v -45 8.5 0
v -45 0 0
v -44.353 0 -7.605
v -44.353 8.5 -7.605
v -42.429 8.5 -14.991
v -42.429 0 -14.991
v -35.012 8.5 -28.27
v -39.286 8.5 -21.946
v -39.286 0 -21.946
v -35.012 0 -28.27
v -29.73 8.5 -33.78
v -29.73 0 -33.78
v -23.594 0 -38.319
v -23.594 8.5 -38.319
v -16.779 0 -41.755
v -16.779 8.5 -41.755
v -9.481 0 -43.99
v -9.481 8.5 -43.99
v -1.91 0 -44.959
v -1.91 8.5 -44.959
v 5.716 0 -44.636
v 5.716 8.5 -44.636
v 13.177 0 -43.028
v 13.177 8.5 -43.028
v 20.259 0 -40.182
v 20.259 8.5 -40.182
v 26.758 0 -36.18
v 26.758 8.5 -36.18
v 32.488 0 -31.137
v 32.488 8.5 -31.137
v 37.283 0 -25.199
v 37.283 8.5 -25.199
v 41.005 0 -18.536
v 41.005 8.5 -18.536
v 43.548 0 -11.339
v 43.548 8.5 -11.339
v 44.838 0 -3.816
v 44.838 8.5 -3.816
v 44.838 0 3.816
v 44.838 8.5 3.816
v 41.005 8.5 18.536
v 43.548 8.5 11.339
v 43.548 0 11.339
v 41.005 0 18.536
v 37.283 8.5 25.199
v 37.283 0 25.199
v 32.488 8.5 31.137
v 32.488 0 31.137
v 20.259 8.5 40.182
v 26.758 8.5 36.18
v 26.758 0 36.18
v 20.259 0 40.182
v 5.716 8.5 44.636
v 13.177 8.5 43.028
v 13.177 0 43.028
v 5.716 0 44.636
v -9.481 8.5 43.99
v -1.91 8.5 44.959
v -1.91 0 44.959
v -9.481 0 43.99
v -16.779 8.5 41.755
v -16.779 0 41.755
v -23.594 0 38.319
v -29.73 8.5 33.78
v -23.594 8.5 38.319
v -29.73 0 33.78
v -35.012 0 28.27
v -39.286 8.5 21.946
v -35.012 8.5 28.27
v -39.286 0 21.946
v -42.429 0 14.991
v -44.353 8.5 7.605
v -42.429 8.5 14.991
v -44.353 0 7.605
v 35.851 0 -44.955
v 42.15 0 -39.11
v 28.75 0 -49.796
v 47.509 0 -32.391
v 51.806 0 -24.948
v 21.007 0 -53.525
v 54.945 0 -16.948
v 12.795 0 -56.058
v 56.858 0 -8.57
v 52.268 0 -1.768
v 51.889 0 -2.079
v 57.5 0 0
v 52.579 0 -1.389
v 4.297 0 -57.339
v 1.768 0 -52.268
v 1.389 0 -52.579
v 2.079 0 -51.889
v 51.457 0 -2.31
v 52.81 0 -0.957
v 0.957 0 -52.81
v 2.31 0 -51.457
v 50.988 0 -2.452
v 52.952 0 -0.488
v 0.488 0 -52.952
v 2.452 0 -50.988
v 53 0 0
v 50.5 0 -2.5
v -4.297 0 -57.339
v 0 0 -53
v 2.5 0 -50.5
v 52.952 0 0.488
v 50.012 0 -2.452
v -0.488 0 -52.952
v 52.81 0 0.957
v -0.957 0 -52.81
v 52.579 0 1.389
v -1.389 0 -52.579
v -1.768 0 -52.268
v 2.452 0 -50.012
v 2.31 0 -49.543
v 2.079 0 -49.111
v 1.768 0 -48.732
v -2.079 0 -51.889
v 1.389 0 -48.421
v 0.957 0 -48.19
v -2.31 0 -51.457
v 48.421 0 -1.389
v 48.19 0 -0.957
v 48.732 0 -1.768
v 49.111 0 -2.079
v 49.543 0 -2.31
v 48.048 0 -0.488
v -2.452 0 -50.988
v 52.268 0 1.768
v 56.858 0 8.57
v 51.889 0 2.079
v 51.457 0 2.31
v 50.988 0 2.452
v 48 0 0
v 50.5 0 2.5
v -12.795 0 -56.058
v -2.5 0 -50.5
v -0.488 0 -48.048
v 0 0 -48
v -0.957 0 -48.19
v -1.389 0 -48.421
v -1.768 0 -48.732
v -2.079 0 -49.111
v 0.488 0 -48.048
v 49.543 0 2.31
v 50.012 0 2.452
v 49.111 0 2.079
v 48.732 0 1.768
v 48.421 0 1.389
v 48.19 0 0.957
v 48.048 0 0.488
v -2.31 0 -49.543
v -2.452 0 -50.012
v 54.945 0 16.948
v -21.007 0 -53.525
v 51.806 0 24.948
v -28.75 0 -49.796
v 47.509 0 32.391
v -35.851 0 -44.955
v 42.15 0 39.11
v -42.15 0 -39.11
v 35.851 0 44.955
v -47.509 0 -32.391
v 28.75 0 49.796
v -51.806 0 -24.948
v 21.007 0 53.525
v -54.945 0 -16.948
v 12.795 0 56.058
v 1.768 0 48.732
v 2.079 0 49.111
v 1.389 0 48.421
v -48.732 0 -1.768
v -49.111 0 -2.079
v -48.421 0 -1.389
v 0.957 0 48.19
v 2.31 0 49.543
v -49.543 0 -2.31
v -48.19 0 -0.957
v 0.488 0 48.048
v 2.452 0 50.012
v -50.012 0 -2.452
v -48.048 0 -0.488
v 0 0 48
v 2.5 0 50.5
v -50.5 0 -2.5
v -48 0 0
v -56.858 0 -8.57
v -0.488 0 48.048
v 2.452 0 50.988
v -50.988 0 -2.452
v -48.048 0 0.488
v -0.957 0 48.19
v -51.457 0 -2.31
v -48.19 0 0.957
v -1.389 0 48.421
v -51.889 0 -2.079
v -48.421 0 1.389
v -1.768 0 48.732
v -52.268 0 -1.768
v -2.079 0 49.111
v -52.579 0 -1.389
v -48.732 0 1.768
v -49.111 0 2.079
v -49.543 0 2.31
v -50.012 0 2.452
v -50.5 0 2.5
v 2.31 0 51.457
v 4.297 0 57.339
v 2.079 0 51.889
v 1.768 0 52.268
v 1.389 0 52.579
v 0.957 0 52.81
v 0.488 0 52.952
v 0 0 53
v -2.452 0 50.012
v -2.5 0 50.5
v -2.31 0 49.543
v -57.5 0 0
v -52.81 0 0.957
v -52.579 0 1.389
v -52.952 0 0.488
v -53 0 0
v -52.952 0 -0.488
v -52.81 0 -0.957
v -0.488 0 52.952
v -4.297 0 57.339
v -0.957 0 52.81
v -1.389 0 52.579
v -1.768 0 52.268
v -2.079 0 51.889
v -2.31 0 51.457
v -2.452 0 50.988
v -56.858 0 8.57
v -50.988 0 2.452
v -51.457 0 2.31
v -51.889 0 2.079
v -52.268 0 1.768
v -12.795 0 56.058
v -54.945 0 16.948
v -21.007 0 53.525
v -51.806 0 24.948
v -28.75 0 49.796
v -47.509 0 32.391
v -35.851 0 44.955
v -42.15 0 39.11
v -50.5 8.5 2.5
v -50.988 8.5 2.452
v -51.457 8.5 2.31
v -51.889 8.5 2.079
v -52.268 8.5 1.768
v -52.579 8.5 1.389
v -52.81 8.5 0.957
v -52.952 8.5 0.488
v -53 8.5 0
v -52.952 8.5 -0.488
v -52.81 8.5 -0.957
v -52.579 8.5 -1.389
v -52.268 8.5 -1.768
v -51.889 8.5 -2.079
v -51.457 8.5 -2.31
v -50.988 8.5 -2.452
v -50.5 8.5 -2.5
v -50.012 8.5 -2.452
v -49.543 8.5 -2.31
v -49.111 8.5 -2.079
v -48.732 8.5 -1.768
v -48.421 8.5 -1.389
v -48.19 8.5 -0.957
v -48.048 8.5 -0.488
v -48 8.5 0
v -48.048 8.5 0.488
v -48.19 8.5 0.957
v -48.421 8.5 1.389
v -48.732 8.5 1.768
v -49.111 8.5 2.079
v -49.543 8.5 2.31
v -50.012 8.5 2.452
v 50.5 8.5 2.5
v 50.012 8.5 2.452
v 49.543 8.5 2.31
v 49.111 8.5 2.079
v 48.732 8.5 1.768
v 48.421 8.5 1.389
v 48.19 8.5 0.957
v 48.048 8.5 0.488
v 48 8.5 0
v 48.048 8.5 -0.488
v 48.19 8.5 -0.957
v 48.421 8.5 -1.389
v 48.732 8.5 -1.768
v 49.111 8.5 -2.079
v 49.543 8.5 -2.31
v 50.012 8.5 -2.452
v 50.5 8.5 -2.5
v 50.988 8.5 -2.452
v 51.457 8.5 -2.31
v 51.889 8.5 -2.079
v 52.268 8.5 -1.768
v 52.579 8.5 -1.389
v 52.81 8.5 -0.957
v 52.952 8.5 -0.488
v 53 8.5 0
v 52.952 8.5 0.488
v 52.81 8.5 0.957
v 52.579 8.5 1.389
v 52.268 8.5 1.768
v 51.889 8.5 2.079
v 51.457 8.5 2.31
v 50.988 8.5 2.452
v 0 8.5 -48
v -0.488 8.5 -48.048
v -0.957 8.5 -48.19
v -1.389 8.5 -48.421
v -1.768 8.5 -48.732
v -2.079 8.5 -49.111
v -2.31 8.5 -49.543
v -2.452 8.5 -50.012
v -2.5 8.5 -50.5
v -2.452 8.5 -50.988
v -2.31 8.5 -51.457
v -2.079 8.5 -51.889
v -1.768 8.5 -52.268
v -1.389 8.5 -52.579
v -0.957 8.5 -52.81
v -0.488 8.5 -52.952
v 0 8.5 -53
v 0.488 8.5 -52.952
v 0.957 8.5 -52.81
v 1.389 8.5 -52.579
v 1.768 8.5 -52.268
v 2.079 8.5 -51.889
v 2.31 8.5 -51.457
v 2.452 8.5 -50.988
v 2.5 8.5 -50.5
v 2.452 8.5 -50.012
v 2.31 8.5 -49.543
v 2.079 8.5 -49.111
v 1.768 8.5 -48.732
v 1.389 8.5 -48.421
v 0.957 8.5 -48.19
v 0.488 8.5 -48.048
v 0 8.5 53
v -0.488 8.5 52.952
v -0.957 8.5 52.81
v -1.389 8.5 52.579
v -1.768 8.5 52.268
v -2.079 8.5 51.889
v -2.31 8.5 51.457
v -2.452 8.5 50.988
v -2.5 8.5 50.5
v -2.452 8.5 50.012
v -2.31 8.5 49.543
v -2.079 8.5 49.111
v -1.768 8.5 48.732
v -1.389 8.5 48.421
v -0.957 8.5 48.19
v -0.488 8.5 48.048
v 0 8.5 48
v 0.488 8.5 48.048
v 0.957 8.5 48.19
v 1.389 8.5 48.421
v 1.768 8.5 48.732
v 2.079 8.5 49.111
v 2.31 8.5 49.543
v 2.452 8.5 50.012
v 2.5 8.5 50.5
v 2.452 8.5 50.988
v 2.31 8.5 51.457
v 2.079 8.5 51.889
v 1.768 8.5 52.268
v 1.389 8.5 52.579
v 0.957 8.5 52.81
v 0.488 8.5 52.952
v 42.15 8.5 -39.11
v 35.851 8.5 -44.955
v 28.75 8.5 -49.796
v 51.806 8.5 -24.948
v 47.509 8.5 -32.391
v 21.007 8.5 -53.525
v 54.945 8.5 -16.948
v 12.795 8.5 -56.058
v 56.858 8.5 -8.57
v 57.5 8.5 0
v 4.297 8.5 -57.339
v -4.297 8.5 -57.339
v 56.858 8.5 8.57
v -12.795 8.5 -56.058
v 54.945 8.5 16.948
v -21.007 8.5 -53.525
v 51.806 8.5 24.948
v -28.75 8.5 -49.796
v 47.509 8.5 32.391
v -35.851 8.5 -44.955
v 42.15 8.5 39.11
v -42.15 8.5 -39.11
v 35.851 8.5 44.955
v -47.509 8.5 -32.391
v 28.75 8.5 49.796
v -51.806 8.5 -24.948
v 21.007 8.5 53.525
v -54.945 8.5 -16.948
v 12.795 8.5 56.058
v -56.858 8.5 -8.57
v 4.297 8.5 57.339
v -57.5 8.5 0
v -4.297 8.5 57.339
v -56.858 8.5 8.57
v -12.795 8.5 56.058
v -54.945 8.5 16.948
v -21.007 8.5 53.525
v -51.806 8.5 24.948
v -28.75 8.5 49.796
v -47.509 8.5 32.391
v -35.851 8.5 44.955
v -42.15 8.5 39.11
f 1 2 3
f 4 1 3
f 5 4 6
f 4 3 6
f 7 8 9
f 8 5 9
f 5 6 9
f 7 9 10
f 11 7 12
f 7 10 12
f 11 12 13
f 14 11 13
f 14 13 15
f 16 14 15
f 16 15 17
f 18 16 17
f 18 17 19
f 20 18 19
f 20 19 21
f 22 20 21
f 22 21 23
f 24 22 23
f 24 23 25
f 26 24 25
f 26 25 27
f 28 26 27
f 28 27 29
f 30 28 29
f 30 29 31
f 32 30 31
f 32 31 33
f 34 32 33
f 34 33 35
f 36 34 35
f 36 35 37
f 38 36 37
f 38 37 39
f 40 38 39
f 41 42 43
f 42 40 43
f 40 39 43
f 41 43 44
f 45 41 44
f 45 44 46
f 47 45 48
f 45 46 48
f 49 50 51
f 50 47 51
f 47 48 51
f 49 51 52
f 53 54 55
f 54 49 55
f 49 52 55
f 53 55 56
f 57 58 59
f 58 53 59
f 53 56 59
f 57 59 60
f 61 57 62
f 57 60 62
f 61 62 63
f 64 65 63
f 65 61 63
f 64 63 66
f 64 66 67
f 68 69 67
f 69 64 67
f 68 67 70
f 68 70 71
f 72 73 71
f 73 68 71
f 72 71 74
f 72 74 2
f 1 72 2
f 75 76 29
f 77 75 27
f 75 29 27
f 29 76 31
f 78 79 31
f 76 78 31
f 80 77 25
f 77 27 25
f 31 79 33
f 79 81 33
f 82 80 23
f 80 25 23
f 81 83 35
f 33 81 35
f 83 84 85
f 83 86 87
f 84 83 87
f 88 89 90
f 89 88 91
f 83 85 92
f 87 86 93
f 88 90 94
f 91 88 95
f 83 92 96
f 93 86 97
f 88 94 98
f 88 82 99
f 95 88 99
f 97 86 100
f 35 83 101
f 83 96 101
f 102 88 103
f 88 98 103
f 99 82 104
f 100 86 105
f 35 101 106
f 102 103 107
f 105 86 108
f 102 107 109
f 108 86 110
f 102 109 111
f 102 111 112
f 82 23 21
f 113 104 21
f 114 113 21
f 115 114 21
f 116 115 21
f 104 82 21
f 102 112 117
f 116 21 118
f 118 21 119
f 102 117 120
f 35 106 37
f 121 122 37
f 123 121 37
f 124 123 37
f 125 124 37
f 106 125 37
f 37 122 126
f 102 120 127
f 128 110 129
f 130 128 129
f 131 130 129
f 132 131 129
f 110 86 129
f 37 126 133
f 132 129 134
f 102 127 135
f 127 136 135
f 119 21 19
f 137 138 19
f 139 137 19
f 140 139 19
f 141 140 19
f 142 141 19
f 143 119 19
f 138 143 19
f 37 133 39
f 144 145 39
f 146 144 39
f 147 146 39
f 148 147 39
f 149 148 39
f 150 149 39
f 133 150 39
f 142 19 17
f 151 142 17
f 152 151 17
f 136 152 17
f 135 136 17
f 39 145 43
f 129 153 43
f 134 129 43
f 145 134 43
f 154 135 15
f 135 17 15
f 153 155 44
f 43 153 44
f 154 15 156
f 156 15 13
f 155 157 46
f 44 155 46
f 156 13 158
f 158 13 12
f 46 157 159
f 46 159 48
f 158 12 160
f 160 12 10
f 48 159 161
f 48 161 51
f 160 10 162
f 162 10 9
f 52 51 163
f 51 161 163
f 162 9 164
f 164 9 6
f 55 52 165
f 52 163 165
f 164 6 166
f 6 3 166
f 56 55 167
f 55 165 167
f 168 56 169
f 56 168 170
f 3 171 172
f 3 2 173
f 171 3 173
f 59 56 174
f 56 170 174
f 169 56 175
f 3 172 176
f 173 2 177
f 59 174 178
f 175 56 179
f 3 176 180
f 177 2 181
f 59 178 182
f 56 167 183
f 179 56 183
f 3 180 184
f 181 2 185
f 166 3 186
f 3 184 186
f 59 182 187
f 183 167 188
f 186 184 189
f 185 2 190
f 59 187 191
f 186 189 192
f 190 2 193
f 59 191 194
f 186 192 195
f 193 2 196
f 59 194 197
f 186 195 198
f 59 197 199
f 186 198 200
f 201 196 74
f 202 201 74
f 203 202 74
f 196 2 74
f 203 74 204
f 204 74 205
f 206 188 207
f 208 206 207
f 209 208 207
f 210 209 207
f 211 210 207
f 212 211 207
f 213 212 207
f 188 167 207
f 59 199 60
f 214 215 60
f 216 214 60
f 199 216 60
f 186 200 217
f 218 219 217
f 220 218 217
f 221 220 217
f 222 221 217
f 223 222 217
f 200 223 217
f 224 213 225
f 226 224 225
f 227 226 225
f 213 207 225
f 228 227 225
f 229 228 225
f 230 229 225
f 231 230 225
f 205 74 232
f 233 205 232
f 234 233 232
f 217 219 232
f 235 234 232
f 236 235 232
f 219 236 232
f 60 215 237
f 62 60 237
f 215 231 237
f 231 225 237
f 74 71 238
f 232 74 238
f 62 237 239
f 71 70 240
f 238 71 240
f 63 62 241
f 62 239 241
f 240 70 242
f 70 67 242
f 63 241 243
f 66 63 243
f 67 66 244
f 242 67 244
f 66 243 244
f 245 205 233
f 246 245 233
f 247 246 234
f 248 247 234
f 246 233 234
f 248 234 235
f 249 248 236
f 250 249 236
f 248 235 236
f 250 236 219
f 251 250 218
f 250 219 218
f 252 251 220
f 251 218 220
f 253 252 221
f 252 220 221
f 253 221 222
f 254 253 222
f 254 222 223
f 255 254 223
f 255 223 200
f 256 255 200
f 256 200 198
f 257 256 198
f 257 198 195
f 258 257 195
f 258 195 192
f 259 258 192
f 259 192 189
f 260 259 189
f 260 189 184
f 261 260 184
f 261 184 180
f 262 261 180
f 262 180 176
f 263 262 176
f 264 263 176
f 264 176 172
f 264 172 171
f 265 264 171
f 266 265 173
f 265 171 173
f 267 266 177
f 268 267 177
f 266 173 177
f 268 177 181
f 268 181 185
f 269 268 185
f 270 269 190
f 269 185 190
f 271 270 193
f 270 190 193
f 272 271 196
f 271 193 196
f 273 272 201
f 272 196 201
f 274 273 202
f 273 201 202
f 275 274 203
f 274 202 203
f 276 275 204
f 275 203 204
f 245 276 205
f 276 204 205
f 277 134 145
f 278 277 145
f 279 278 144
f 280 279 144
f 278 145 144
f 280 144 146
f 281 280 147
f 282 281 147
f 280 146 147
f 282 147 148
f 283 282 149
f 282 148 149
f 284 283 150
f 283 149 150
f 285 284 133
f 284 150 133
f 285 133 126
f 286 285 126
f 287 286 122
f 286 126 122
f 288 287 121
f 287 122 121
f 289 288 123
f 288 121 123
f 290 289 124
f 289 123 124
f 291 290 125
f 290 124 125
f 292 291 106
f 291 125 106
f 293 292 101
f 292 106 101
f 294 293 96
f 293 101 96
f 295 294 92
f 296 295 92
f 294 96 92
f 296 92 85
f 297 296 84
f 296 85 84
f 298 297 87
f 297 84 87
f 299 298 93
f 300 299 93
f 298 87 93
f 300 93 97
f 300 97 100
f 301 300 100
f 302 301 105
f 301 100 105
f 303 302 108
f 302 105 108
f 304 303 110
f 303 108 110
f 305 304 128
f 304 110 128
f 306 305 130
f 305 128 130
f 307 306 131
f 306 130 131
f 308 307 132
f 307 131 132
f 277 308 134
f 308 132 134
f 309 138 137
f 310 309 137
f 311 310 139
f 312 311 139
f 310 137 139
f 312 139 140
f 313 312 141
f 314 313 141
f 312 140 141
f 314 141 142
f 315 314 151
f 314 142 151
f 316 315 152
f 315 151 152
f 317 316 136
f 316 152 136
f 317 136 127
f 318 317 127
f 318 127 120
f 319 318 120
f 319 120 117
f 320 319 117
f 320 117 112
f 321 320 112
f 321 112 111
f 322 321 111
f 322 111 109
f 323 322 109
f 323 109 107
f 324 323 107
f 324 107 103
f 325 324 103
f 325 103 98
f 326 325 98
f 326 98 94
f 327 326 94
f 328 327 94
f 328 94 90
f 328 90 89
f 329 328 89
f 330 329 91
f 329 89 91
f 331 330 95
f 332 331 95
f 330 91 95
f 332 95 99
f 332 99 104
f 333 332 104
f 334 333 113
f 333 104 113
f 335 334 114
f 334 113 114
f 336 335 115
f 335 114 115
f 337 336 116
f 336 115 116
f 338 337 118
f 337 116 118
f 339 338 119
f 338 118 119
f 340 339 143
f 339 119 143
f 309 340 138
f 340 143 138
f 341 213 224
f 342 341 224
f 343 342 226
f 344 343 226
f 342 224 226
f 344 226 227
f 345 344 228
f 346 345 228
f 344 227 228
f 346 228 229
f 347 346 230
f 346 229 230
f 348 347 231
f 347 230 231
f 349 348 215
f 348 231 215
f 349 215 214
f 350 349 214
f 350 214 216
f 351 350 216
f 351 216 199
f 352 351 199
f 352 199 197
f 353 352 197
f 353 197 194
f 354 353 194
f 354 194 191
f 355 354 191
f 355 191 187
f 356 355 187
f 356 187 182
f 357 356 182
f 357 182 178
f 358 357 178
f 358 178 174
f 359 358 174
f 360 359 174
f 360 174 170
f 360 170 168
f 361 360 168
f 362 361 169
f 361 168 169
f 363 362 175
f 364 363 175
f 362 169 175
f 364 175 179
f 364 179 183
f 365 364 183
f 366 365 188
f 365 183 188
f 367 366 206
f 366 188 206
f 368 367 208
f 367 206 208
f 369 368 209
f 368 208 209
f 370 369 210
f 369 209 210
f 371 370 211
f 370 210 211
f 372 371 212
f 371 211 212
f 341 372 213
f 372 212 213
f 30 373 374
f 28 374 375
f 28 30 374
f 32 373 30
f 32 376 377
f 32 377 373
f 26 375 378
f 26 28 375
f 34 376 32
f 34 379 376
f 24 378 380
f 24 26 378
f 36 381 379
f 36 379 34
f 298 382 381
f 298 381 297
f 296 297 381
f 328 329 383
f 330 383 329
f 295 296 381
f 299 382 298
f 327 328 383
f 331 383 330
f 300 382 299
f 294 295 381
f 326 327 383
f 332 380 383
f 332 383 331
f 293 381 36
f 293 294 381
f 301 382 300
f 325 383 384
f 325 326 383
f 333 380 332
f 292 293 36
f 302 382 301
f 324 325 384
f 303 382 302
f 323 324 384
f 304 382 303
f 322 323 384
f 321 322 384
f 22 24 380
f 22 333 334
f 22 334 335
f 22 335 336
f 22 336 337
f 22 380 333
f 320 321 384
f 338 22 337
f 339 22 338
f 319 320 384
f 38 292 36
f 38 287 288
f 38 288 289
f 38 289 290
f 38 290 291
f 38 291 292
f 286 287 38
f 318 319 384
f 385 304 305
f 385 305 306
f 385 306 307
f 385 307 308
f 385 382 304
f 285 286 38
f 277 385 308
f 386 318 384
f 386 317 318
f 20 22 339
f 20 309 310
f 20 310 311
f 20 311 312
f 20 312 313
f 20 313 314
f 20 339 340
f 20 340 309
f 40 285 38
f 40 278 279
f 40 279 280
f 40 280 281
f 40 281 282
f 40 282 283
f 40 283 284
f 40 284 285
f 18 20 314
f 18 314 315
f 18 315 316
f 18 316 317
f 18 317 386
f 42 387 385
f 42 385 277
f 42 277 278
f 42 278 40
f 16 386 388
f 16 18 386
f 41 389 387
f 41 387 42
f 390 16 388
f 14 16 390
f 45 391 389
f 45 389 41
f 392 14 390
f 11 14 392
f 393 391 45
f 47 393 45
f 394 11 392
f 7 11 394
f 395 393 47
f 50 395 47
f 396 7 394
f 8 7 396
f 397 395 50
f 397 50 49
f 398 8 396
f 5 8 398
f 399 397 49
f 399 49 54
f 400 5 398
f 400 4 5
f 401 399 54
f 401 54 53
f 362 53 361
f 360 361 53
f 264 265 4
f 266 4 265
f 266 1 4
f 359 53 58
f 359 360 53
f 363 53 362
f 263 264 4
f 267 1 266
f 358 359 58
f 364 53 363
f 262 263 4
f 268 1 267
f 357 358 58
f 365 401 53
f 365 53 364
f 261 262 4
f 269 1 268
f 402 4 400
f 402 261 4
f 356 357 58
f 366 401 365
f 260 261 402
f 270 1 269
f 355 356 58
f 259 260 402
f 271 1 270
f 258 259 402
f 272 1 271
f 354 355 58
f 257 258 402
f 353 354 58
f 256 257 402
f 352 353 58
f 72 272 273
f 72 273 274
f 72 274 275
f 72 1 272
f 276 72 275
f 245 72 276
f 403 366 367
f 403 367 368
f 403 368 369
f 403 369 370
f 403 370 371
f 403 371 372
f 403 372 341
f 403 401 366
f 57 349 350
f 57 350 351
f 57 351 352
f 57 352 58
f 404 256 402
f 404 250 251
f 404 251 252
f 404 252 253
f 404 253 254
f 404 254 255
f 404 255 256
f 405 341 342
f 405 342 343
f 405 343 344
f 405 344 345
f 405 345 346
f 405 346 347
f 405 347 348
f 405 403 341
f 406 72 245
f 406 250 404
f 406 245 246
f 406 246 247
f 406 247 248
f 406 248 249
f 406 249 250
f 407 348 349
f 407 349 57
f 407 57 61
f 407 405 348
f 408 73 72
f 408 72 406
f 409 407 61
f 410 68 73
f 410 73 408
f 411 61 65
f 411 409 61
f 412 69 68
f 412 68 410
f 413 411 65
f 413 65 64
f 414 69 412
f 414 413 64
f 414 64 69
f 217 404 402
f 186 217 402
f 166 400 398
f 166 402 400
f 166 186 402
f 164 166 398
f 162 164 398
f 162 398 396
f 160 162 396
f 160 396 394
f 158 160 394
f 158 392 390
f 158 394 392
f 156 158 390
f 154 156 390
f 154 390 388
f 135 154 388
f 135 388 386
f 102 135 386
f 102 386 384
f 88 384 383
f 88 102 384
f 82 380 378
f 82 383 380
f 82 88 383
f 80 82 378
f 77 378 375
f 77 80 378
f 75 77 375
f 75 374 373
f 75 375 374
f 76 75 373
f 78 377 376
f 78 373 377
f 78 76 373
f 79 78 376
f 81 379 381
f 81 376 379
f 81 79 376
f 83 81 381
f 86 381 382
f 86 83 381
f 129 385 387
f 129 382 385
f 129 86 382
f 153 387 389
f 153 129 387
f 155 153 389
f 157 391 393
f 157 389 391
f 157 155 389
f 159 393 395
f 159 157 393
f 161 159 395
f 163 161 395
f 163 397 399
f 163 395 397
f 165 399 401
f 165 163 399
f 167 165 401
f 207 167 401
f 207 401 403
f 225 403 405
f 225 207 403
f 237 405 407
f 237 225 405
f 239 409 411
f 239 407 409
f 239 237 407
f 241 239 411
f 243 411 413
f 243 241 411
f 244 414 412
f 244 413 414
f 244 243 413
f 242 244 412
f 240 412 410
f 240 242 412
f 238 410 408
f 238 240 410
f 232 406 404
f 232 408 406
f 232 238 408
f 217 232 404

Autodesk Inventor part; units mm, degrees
ref_plane "YZ Plane" through (0, 0, 0) normal (1, 0, 0) x (0, 1, 0)
ref_plane "XZ Plane" through (0, 0, 0) normal (0, 1, 0) x (-1, 0, 0)
ref_plane "XY Plane" through (0, 0, 0) normal (0, 0, 1) x (1, 0, 0)
sketch "スケッチ1" plane through (0, 0, 0) normal (0, 1, 0) x (-1, 0, 0)
  circle A0 centre (0, 0) radius 45
  circle A1 centre (0, 0) radius 57.5
  dimension "d0" = 90
  dimension "d1" = 115
extrude "押し出し1" add sketch "スケッチ1" along normal blind 8.5
sketch "スケッチ2" plane through (0, 8.5, 0) normal (0, 1, 0) x (1, 0, 0)
  point P0 (0, 0)
  point P1 (-50.5, 0)
  point P2 (0, -50.5)
  point P3 (50.5, 0)
  point P4 (0, 50.5)
  dimension "d4" = 50.5
  dimension "d7" = 360
hole "穴1" at (-50.5, 8.5, 0) at (0, 8.5, 50.5) at (50.5, 8.5, 0) at (0, 8.5, -50.5) direction (0, -1, 0) diameter 5 end through all
properties part number "turntable1" material "アルミニウム 6061"
